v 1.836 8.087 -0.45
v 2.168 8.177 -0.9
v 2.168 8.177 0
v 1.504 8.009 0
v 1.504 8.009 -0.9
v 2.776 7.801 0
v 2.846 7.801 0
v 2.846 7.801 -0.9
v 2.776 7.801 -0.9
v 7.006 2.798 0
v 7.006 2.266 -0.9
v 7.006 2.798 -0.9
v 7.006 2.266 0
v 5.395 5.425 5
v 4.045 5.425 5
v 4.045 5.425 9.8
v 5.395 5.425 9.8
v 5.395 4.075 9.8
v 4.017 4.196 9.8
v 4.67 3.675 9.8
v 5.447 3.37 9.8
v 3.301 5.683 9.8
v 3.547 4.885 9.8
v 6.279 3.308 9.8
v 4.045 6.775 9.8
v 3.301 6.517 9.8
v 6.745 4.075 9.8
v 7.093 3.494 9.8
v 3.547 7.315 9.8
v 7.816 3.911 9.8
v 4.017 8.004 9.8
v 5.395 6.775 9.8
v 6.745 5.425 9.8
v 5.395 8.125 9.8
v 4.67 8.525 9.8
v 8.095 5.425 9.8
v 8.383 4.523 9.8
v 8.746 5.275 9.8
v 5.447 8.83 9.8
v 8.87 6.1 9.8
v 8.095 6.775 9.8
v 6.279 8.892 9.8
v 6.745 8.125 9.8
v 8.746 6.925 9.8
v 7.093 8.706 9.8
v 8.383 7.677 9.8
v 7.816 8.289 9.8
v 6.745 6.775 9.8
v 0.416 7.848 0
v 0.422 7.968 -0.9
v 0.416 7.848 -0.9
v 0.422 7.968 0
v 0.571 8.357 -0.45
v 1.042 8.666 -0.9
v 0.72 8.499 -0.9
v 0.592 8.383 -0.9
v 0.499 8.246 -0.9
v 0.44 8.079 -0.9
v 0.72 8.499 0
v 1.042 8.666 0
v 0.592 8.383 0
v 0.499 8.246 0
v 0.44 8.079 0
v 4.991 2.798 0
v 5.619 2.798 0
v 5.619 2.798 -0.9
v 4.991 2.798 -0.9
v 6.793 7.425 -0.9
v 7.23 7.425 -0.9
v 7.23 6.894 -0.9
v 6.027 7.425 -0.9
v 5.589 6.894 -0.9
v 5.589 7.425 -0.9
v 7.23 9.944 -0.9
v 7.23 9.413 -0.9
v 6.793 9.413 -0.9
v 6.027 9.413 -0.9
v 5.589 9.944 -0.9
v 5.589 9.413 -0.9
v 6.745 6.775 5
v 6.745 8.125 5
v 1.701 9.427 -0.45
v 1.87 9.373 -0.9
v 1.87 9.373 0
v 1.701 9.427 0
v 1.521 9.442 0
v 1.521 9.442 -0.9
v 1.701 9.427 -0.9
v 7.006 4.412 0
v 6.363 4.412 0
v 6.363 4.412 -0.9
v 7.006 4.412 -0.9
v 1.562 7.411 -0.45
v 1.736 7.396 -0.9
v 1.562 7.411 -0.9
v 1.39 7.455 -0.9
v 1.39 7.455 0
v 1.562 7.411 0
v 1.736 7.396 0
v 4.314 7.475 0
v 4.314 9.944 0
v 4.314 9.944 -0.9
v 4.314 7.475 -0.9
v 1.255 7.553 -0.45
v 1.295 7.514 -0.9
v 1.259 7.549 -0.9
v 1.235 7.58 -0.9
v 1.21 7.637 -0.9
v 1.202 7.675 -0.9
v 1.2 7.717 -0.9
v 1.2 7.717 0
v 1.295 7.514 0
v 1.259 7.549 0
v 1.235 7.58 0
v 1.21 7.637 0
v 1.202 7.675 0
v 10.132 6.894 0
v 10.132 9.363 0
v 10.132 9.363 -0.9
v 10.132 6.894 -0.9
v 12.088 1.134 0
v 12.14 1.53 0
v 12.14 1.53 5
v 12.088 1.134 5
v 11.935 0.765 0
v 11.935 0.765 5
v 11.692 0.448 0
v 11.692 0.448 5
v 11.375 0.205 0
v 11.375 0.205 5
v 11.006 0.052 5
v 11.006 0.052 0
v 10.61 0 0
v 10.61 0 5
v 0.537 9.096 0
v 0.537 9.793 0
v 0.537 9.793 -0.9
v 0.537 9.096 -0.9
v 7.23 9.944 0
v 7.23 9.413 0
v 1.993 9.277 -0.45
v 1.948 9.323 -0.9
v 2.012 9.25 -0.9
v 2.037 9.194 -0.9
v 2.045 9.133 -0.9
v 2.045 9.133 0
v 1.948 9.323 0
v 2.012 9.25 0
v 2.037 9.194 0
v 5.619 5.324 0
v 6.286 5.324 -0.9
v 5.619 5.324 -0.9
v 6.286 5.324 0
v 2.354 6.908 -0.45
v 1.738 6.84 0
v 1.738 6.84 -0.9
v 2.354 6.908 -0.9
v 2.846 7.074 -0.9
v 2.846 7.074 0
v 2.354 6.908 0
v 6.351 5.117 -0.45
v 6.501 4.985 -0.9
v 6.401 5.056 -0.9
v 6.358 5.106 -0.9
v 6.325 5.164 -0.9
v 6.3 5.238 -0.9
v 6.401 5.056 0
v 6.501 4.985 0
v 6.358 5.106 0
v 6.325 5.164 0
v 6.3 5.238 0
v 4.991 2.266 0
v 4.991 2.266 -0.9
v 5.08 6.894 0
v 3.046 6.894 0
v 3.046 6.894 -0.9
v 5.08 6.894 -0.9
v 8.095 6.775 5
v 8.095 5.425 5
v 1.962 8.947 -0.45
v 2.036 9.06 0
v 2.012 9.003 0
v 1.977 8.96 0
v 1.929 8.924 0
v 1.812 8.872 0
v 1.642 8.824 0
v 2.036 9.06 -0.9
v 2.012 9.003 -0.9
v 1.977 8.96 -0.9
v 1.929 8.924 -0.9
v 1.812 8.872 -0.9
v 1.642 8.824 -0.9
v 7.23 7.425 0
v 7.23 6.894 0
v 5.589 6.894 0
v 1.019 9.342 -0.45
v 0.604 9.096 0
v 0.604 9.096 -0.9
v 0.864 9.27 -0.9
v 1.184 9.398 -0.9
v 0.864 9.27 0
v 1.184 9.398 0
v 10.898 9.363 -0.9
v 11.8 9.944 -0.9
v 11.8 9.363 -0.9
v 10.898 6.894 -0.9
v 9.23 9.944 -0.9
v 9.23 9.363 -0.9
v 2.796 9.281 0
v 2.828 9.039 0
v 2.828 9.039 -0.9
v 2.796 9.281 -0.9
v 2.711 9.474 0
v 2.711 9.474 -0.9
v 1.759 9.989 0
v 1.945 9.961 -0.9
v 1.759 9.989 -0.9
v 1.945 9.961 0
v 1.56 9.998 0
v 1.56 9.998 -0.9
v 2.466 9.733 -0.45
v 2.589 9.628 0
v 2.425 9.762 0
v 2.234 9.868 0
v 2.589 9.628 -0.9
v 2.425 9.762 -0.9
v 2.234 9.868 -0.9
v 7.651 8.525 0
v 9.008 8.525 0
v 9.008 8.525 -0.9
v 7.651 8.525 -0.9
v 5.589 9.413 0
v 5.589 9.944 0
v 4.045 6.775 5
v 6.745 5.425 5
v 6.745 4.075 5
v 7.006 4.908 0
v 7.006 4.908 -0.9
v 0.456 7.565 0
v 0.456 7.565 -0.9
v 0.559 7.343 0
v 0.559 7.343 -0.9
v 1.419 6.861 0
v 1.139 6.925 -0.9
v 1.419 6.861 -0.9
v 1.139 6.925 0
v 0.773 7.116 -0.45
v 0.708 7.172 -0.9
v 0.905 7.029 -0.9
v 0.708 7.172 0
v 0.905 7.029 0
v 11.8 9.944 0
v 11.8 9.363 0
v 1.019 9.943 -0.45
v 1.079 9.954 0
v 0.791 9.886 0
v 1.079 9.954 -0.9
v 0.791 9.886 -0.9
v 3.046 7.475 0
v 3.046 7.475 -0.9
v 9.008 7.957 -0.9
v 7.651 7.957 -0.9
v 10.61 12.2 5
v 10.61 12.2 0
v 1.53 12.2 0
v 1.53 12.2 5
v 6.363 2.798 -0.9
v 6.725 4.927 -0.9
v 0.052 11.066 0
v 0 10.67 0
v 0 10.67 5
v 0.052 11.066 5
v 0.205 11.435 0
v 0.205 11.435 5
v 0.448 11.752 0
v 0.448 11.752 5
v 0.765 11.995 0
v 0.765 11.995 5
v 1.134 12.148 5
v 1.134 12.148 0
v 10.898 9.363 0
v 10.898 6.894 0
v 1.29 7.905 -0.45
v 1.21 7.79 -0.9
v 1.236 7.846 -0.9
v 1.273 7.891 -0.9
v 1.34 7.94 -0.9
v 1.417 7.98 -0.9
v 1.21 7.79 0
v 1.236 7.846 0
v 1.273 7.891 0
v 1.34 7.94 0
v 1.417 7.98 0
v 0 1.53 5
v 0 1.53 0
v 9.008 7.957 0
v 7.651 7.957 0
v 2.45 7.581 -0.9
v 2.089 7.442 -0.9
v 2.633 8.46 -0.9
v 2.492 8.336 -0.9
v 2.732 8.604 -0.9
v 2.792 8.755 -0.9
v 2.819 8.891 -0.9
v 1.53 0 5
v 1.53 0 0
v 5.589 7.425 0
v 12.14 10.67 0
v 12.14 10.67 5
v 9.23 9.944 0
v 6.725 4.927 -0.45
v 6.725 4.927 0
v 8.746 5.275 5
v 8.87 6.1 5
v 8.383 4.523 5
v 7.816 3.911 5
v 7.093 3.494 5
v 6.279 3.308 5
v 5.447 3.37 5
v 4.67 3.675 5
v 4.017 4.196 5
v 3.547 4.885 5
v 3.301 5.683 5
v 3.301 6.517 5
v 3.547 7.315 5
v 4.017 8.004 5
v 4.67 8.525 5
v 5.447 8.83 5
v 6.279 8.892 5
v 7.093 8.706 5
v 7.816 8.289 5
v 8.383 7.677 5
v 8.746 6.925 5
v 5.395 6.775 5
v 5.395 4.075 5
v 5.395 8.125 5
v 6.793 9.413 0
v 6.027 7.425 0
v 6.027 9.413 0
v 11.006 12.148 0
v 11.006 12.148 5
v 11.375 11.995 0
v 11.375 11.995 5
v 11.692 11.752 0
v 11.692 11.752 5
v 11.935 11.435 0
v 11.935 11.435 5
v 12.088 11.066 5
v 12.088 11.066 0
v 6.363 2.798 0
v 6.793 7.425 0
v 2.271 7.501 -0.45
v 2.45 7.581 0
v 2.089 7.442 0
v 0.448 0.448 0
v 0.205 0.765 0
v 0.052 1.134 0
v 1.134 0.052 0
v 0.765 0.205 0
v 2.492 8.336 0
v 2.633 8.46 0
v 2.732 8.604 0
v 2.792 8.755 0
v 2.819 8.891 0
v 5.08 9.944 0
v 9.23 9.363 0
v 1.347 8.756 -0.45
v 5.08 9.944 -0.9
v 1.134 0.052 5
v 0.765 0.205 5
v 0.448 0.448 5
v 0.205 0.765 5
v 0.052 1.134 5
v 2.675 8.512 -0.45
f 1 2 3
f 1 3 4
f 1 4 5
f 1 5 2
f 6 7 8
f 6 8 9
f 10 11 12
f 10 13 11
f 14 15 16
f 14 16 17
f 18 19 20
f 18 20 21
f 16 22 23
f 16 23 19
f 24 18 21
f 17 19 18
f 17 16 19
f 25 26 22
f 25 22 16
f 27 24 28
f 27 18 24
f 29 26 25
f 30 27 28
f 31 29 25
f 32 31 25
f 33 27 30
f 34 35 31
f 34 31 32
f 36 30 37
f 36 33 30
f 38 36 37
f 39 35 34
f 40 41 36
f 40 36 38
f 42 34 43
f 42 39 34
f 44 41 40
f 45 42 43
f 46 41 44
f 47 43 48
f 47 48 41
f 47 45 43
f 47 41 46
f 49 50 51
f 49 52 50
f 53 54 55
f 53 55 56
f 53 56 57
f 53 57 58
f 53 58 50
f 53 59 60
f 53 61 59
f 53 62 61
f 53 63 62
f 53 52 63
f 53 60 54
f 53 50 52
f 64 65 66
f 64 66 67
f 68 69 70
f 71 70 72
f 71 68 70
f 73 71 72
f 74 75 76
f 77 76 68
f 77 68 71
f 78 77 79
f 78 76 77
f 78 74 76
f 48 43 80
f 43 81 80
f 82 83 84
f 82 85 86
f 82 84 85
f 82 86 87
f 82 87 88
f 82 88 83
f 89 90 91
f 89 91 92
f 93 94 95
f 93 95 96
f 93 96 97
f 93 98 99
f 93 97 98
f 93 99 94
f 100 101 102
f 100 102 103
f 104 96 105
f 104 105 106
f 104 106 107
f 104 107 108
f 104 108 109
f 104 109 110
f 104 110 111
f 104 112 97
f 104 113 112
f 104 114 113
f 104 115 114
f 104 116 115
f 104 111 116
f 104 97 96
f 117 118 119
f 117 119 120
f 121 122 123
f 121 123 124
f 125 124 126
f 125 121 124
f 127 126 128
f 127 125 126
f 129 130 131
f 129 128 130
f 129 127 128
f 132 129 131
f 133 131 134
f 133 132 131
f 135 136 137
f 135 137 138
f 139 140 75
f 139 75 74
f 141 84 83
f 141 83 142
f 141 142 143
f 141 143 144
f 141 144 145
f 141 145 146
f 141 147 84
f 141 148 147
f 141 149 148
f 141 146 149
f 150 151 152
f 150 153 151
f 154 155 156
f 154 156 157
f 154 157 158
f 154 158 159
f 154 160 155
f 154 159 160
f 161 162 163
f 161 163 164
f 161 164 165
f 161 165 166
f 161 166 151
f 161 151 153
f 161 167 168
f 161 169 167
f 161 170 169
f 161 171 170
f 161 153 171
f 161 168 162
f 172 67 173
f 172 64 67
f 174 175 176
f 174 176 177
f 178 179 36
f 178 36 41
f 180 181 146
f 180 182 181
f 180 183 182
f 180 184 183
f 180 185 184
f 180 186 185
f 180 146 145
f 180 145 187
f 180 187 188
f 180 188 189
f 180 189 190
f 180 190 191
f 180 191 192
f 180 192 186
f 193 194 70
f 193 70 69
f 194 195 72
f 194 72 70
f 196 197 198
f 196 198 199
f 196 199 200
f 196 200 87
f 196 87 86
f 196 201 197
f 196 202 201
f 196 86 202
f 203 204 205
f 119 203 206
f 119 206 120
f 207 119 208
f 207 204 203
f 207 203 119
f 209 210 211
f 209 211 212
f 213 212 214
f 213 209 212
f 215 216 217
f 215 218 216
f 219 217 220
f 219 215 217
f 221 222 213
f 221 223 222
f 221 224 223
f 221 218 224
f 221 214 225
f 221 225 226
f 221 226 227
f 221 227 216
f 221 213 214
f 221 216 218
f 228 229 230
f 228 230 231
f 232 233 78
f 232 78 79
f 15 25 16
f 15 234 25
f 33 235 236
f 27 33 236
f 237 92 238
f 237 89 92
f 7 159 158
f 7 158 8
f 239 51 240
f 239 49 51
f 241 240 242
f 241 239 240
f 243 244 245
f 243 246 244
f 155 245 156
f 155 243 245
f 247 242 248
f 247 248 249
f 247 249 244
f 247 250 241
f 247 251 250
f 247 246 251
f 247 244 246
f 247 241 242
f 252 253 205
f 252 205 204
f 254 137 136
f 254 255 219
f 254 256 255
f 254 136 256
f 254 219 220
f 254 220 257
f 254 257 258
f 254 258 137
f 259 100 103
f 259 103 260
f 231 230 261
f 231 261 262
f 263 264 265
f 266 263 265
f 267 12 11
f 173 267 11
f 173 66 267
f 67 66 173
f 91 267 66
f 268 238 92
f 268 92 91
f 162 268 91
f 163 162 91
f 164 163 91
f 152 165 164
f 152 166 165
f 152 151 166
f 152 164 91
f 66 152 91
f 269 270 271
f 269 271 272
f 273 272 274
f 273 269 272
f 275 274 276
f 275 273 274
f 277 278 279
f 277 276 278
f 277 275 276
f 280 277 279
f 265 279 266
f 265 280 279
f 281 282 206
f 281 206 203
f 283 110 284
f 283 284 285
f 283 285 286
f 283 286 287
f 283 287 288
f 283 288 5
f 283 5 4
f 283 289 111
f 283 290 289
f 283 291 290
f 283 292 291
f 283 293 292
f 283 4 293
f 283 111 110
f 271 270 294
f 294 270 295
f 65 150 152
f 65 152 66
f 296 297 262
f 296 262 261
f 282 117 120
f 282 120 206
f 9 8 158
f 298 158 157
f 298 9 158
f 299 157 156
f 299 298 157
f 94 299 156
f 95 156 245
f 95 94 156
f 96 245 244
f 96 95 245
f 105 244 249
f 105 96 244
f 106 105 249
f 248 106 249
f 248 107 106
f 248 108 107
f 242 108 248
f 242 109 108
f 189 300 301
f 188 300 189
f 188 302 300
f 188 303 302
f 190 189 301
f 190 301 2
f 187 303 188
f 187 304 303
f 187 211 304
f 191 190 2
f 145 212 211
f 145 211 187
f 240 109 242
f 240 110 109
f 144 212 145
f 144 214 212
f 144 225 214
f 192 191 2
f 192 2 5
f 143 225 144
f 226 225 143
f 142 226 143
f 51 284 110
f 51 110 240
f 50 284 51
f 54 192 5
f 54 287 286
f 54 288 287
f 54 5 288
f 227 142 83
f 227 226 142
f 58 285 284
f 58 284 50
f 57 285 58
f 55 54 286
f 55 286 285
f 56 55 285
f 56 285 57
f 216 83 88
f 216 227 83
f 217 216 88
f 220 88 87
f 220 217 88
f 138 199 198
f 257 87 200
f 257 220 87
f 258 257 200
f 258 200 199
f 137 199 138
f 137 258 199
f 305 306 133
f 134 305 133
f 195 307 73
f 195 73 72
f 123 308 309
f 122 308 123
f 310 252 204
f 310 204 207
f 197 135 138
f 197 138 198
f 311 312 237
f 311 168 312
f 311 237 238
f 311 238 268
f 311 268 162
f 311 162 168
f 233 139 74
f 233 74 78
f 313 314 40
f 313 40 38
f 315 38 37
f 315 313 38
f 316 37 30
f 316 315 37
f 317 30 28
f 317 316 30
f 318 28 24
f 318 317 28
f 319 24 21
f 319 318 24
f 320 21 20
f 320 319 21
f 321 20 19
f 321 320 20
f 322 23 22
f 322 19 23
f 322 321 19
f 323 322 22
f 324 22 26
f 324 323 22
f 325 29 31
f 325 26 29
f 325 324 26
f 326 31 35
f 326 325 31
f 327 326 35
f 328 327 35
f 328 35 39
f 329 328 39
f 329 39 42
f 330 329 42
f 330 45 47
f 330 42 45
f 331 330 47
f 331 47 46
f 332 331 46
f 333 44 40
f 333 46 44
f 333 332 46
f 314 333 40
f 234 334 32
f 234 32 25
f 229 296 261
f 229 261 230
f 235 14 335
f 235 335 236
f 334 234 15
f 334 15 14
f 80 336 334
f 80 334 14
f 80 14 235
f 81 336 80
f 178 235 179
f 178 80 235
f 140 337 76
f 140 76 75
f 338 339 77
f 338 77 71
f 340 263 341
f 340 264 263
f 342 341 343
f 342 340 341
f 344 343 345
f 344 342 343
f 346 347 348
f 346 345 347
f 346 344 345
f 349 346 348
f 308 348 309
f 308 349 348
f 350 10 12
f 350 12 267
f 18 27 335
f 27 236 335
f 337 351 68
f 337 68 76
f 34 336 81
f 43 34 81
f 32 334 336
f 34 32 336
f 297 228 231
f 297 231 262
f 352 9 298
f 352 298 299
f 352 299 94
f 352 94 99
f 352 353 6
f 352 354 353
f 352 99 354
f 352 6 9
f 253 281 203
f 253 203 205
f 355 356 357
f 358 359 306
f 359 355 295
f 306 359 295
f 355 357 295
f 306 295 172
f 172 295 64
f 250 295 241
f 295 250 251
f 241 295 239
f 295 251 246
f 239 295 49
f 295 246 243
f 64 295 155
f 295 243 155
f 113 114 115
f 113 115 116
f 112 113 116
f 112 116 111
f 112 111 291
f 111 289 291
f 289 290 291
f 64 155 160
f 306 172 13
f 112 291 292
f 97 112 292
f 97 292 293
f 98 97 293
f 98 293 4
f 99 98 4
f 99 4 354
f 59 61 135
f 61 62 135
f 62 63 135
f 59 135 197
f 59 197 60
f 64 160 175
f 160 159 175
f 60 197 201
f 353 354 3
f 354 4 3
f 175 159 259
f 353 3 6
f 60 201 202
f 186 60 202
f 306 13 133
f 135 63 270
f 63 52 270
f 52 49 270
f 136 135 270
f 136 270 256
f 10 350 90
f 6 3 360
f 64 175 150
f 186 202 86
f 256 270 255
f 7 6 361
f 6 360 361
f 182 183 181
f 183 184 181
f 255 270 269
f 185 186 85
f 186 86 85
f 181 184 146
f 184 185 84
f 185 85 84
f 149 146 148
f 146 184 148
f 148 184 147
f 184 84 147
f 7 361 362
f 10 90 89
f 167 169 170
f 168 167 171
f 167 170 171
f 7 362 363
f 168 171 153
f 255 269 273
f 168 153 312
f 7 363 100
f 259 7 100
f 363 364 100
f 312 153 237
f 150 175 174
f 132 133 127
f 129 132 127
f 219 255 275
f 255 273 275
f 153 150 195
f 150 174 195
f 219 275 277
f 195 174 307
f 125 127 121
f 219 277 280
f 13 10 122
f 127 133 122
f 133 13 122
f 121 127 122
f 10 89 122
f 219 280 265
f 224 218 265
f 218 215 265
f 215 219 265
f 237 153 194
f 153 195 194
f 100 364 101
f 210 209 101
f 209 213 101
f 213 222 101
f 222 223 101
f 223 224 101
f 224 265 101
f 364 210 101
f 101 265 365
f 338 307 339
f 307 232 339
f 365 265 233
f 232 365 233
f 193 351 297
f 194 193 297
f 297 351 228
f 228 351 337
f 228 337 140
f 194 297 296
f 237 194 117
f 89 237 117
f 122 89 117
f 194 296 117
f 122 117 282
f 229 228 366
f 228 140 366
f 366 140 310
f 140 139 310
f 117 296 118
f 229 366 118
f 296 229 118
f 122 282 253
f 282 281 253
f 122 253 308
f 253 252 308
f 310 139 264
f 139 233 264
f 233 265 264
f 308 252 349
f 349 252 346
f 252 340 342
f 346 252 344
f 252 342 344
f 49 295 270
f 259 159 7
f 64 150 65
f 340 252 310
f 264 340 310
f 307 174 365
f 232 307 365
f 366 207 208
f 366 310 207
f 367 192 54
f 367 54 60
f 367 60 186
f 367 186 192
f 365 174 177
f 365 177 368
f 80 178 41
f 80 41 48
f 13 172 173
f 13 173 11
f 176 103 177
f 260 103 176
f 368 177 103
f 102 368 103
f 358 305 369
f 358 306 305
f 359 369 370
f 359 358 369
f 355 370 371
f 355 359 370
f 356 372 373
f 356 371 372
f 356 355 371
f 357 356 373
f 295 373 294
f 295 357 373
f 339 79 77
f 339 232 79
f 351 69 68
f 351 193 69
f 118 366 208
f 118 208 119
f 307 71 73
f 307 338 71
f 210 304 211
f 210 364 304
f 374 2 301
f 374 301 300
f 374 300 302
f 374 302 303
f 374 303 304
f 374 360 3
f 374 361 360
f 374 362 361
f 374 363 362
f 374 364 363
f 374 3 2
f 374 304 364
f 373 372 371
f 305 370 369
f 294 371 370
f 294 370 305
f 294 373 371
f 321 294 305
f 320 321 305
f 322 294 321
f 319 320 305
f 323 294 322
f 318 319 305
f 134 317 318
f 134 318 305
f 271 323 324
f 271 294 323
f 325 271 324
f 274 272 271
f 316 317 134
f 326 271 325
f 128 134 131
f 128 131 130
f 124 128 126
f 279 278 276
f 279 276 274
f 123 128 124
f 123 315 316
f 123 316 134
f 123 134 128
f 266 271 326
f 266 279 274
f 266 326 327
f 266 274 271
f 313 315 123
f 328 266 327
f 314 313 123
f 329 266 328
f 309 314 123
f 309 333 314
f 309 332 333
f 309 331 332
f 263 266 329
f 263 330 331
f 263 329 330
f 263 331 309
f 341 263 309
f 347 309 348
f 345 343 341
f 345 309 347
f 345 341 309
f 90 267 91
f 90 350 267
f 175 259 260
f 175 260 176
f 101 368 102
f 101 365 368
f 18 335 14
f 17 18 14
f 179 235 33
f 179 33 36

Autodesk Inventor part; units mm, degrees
ref_plane "YZ Plane" through (0, 0, 0) normal (1, 0, 0) x (0, 1, 0)
ref_plane "XZ Plane" through (0, 0, 0) normal (0, 1, 0) x (-1, 0, 0)
sketch "Sketch1" plane through (0, 0, 0) normal (0, 0, 1) x (1, 0, 0)
  line L0 (14.6962, 12.74) -> (14.6962, 0) construction
  line L1 (10.61, 12.2) -> (1.53, 12.2)
  arc A0 (1.53, 12.2) -> (0, 10.67) centre (1.53, 10.67) ccw
  line L2 (0, 10.67) -> (0, 1.53)
  arc A1 (0, 1.53) -> (1.53, 0) centre (1.53, 1.53) ccw
  line L3 (1.53, 0) -> (10.61, 0)
  arc A2 (10.61, 0) -> (12.14, 1.53) centre (10.61, 1.53) ccw
  arc A3 (12.14, 10.67) -> (10.61, 12.2) centre (10.61, 10.67) ccw
  line L4 (12.14, 10.67) -> (12.14, 1.53)
  point P0 (0, 0)
  point P1 (0, 0)
  dimension "d10" = 12.74
ref_plane "Work Plane1" through (0, 0, 5) normal (0, 0, 1) x (1, 0, 0)
sketch "Sketch2" plane through (0, 0, 5) normal (0, 0, 1) x (1, 0, 0)
  line L0 (10.88, 12.74) -> (1.8, 12.74) projected
  line L1 (10.88, 12.74) -> (1.8, 12.74) projected
  arc A0 (1.8, 12.74) -> (0, 10.94) centre (1.8, 10.94) ccw projected
  line L2 (0, 10.94) -> (0, 1.8) projected
  arc A1 (0, 1.8) -> (1.8, 0) centre (1.8, 1.8) ccw projected
  line L3 (1.8, 0) -> (10.88, 0) projected
  arc A2 (10.88, 0) -> (12.68, 1.8) centre (10.88, 1.8) ccw projected
  line L4 (12.68, 1.8) -> (12.68, 10.94) projected
  arc A3 (12.68, 10.94) -> (10.88, 12.74) centre (10.88, 10.94) ccw projected
  circle A4 centre (6.34, 6.37) radius 2.8
  line L5 (5.665, 8.395) -> (7.015, 8.395)
  line L6 (7.015, 4.345) -> (5.665, 4.345)
  line L7 (5.665, 4.345) -> (7.015, 8.395) construction
  line L8 (5.665, 8.395) -> (7.015, 4.345) construction
  line L9 (8.365, 5.695) -> (8.365, 7.045)
  line L10 (4.315, 7.045) -> (4.315, 5.695)
  line L11 (4.315, 5.695) -> (8.365, 7.045) construction
  line L12 (8.365, 5.695) -> (4.315, 7.045) construction
  line L13 (4.315, 5.695) -> (5.665, 5.695)
  line L14 (7.015, 5.695) -> (8.365, 5.695)
  line L15 (5.665, 4.345) -> (5.665, 5.695)
  line L16 (5.665, 7.045) -> (5.665, 8.395)
  line L17 (8.365, 7.045) -> (7.015, 7.045)
  line L18 (5.665, 7.045) -> (4.315, 7.045)
  line L19 (7.015, 8.395) -> (7.015, 7.045)
  line L20 (7.015, 5.695) -> (7.015, 4.345)
  point P0 (0, 0)
  dimension "d3" = 5.6
  dimension "d4" = 4.05
  dimension "d5" = 1.35
  dimension "d6" = 4.05
  dimension "d7" = 1.35
extrude "Extrusion3" add sketch "Sketch1" along normal blind 5
sketch "Sketch3" plane through (0, 0, 5) normal (0, 0, 1) x (1, 0, 0)
  line L0 (10.61, 12.47) -> (1.53, 12.47)
  line L1 (10.61, 12.47) -> (1.53, 12.47)
  arc A0 (1.53, 12.47) -> (-0.27, 10.67) centre (1.53, 10.67) ccw
  line L2 (-0.27, 10.67) -> (-0.27, 1.53)
  arc A1 (-0.27, 1.53) -> (1.53, -0.27) centre (1.53, 1.53) ccw
  line L3 (1.53, -0.27) -> (10.61, -0.27)
  arc A2 (10.61, -0.27) -> (12.41, 1.53) centre (10.61, 1.53) ccw
  line L4 (12.41, 1.53) -> (12.41, 10.67)
  arc A3 (12.41, 10.67) -> (10.61, 12.47) centre (10.61, 10.67) ccw
  circle A4 centre (6.07, 6.1) radius 2.8
  line L5 (5.395, 8.125) -> (6.745, 8.125)
  line L6 (6.745, 4.075) -> (5.395, 4.075)
  line L7 (5.395, 4.075) -> (6.745, 8.125) construction
  line L8 (5.395, 8.125) -> (6.745, 4.075) construction
  line L9 (8.095, 5.425) -> (8.095, 6.775)
  line L10 (4.045, 6.775) -> (4.045, 5.425)
  line L11 (4.045, 5.425) -> (8.095, 6.775) construction
  line L12 (8.095, 5.425) -> (4.045, 6.775) construction
  line L13 (4.045, 5.425) -> (5.395, 5.425)
  line L14 (6.745, 5.425) -> (8.095, 5.425)
  line L15 (5.395, 4.075) -> (5.395, 5.425)
  line L16 (5.395, 6.775) -> (5.395, 8.125)
  line L17 (8.095, 6.775) -> (6.745, 6.775)
  line L18 (5.395, 6.775) -> (4.045, 6.775)
  line L19 (6.745, 8.125) -> (6.745, 6.775)
  line L20 (6.745, 5.425) -> (6.745, 4.075)
  line L21 (10.61, 12.2) -> (1.53, 12.2) projected
  line L22 (0, 10.67) -> (0, 1.53) projected
  point P0 (0, 0)
  point P1 (-0.27, -0.27)
  point P2 (6.07, 12.2)
  point P3 (0, 6.1)
  point P4 (6.07, 6.1)
  dimension "d14" = 5.6
  dimension "d15" = 4.05
  dimension "d16" = 1.35
  dimension "d17" = 4.05
  dimension "d18" = 1.35
extrude "Extrusion4" add sketch "Sketch3" along normal blind 4.8 contours A4
sketch "Sketch4" plane through (0, 0, 0) normal (0, 0, -1) x (-1, 0, 0)
  line L0 (-1.53, 0) -> (-10.61, 0) projected
  line L1 (-7.4059, 5.3236) -> (-4.7341, 5.3236) construction
  line L2 (-4.7341, 5.3236) -> (-4.7341, 2.2661) construction
  line L3 (-4.7341, 2.2661) -> (-7.4059, 2.2661) construction
  line L4 (-7.4059, 2.2661) -> (-7.4059, 5.3236) construction
  line L5 (-11.8005, 9.9984) -> (-0.3395, 9.9984) construction
  line L6 (-0.3395, 9.9984) -> (-0.3395, 6.8396) construction
  line L7 (-0.3395, 6.8396) -> (-11.8005, 6.8396) construction
  line L8 (-11.8005, 6.8396) -> (-11.8005, 9.9984) construction
  line L9 (-10.8983, 6.894) -> (-10.8983, 9.3632)
  line L10 (-10.8983, 9.3632) -> (-11.8005, 9.3632)
  line L11 (-11.8005, 9.3632) -> (-11.8005, 9.944)
  line L12 (-11.8005, 9.944) -> (-9.23, 9.944)
  line L13 (-9.23, 9.944) -> (-9.23, 9.3632)
  line L14 (-9.23, 9.3632) -> (-10.1321, 9.3632)
  line L15 (-10.1321, 9.3632) -> (-10.1321, 6.894)
  line L16 (-10.1321, 6.894) -> (-10.8983, 6.894)
  line L17 (-7.6506, 7.9568) -> (-9.0075, 7.9568)
  line L18 (-9.0075, 7.9568) -> (-9.0075, 8.5253)
  line L19 (-9.0075, 8.5253) -> (-7.6506, 8.5253)
  line L20 (-7.6506, 8.5253) -> (-7.6506, 7.9568)
  line L21 (-5.5893, 6.894) -> (-7.2304, 6.894)
  line L22 (-7.2304, 6.894) -> (-7.2304, 7.4254)
  line L23 (-7.2304, 7.4254) -> (-6.793, 7.4254)
  line L24 (-6.793, 7.4254) -> (-6.793, 9.4126)
  line L25 (-6.793, 9.4126) -> (-7.2304, 9.4126)
  line L26 (-7.2304, 9.4126) -> (-7.2304, 9.944)
  line L27 (-7.2304, 9.944) -> (-5.5893, 9.944)
  line L28 (-5.5893, 9.944) -> (-5.5893, 9.4126)
  line L29 (-5.5893, 9.4126) -> (-6.0267, 9.4126)
  line L30 (-6.0267, 9.4126) -> (-6.0267, 7.4254)
  line L31 (-6.0267, 7.4254) -> (-5.5893, 7.4254)
  line L32 (-5.5893, 7.4254) -> (-5.5893, 6.894)
  line L33 (-3.046, 6.894) -> (-5.0801, 6.894)
  line L34 (-5.0801, 6.894) -> (-5.0801, 9.944)
  line L35 (-5.0801, 9.944) -> (-4.3139, 9.944)
  line L36 (-4.3139, 9.944) -> (-4.3139, 7.4748)
  line L37 (-4.3139, 7.4748) -> (-3.046, 7.4748)
  line L38 (-3.046, 7.4748) -> (-3.046, 6.894)
  spline S0 degree 2 poles (-1.7385, 6.8396) (-2.0894, 6.8396) (-2.6184, 6.9756) (-2.8457, 7.0744) knots 0 0 0 1 2 2 2
  line L39 (-2.8457, 7.0744) -> (-2.8457, 7.8011)
  line L40 (-2.8457, 7.8011) -> (-2.7765, 7.8011)
  spline S1 degree 2 poles (-2.7765, 7.8011) (-2.5467, 7.6058) (-1.9955, 7.3957) (-1.736, 7.3957) knots 0 0 0 1 2 2 2
  spline S2 degree 2 poles (-1.736, 7.3957) (-1.6692, 7.3957) (-1.4542, 7.4254) (-1.39, 7.4551) knots 0 0 0 1 2 2 2
  spline S3 degree 2 poles (-1.39, 7.4551) (-1.3109, 7.4897) (-1.1996, 7.6157) (-1.1996, 7.717) knots 0 0 0 1 2 2 2
  spline S4 degree 2 poles (-1.1996, 7.717) (-1.1996, 7.8332) (-1.3801, 7.9766) (-1.5037, 8.0087) knots 0 0 0 1 2 2 2
  spline S5 degree 2 poles (-1.5037, 8.0087) (-1.6594, 8.0507) (-2.0128, 8.1224) (-2.1685, 8.1768) knots 0 0 0 1 2 2 2
  spline S6 degree 2 poles (-2.1685, 8.1768) (-2.522, 8.3004) (-2.8284, 8.723) (-2.8284, 9.0394) knots 0 0 0 1 2 2 2
  spline S7 degree 2 poles (-2.8284, 9.0394) (-2.8284, 9.467) (-2.1043, 9.9984) (-1.5605, 9.9984) knots 0 0 0 1 2 2 2
  spline S8 degree 2 poles (-1.5605, 9.9984) (-1.2886, 9.9984) (-0.7498, 9.8871) (-0.5372, 9.7932) knots 0 0 0 1 2 2 2
  line L41 (-0.5372, 9.7932) -> (-0.5372, 9.0962)
  line L42 (-0.5372, 9.0962) -> (-0.604, 9.0962)
  spline S9 degree 2 poles (-0.604, 9.0962) (-0.7745, 9.242) (-1.2639, 9.4422) (-1.521, 9.4422) knots 0 0 0 1 2 2 2
  spline S10 degree 2 poles (-1.521, 9.4422) (-1.6223, 9.4422) (-1.7805, 9.4126) (-1.8695, 9.373) knots 0 0 0 1 2 2 2
  spline S11 degree 2 poles (-1.8695, 9.373) (-1.9411, 9.3409) (-2.0449, 9.2124) (-2.0449, 9.1333) knots 0 0 0 1 2 2 2
  spline S12 degree 2 poles (-2.0449, 9.1333) (-2.0449, 9.0147) (-1.8793, 8.8787) (-1.6421, 8.8243) knots 0 0 0 1 2 2 2
  spline S13 degree 2 poles (-1.6421, 8.8243) (-1.4888, 8.7897) (-1.2046, 8.723) (-1.0415, 8.6662) knots 0 0 0 1 2 2 2
  spline S14 degree 2 poles (-1.0415, 8.6662) (-0.7251, 8.55) (-0.4161, 8.1644) (-0.4161, 7.848) knots 0 0 0 1 2 2 2
  spline S15 degree 2 poles (-0.4161, 7.848) (-0.4161, 7.3933) (-1.1304, 6.8396) (-1.7385, 6.8396) knots 0 0 0 1 2 2 2
  line L43 (-4.9911, 2.2661) -> (-7.0055, 2.2661)
  line L44 (-7.0055, 2.2661) -> (-7.0055, 2.7975)
  line L45 (-7.0055, 2.7975) -> (-6.3629, 2.7975)
  line L46 (-6.3629, 2.7975) -> (-6.3629, 4.4115)
  line L47 (-6.3629, 4.4115) -> (-7.0055, 4.4115)
  line L48 (-7.0055, 4.4115) -> (-7.0055, 4.9083)
  spline S16 degree 2 poles (-7.0055, 4.9083) (-6.8646, 4.9083) (-6.5853, 4.9454) (-6.5013, 4.9849) knots 0 0 0 1 2 2 2
  spline S17 degree 2 poles (-6.5013, 4.9849) (-6.4049, 5.0344) (-6.2962, 5.2) (-6.2863, 5.3236) knots 0 0 0 1 2 2 2
  line L49 (-6.2863, 5.3236) -> (-5.6189, 5.3236)
  line L50 (-5.6189, 5.3236) -> (-5.6189, 2.7975)
  line L51 (-5.6189, 2.7975) -> (-4.9911, 2.7975)
  line L52 (-4.9911, 2.7975) -> (-4.9911, 2.2661)
  point P0 (0, 0)
  point P1 (-6.07, 0)
  point P2 (-6.07, 2.2661)
  point P3 (-6.07, 2.2661)
  point P4 (-6.07, 6.8396)
  point P5 (-6.07, 6.8396)
extrude "Extrusion5" add sketch "Sketch4" along normal blind 0.9
properties part number "IPC TILS 1 key"
